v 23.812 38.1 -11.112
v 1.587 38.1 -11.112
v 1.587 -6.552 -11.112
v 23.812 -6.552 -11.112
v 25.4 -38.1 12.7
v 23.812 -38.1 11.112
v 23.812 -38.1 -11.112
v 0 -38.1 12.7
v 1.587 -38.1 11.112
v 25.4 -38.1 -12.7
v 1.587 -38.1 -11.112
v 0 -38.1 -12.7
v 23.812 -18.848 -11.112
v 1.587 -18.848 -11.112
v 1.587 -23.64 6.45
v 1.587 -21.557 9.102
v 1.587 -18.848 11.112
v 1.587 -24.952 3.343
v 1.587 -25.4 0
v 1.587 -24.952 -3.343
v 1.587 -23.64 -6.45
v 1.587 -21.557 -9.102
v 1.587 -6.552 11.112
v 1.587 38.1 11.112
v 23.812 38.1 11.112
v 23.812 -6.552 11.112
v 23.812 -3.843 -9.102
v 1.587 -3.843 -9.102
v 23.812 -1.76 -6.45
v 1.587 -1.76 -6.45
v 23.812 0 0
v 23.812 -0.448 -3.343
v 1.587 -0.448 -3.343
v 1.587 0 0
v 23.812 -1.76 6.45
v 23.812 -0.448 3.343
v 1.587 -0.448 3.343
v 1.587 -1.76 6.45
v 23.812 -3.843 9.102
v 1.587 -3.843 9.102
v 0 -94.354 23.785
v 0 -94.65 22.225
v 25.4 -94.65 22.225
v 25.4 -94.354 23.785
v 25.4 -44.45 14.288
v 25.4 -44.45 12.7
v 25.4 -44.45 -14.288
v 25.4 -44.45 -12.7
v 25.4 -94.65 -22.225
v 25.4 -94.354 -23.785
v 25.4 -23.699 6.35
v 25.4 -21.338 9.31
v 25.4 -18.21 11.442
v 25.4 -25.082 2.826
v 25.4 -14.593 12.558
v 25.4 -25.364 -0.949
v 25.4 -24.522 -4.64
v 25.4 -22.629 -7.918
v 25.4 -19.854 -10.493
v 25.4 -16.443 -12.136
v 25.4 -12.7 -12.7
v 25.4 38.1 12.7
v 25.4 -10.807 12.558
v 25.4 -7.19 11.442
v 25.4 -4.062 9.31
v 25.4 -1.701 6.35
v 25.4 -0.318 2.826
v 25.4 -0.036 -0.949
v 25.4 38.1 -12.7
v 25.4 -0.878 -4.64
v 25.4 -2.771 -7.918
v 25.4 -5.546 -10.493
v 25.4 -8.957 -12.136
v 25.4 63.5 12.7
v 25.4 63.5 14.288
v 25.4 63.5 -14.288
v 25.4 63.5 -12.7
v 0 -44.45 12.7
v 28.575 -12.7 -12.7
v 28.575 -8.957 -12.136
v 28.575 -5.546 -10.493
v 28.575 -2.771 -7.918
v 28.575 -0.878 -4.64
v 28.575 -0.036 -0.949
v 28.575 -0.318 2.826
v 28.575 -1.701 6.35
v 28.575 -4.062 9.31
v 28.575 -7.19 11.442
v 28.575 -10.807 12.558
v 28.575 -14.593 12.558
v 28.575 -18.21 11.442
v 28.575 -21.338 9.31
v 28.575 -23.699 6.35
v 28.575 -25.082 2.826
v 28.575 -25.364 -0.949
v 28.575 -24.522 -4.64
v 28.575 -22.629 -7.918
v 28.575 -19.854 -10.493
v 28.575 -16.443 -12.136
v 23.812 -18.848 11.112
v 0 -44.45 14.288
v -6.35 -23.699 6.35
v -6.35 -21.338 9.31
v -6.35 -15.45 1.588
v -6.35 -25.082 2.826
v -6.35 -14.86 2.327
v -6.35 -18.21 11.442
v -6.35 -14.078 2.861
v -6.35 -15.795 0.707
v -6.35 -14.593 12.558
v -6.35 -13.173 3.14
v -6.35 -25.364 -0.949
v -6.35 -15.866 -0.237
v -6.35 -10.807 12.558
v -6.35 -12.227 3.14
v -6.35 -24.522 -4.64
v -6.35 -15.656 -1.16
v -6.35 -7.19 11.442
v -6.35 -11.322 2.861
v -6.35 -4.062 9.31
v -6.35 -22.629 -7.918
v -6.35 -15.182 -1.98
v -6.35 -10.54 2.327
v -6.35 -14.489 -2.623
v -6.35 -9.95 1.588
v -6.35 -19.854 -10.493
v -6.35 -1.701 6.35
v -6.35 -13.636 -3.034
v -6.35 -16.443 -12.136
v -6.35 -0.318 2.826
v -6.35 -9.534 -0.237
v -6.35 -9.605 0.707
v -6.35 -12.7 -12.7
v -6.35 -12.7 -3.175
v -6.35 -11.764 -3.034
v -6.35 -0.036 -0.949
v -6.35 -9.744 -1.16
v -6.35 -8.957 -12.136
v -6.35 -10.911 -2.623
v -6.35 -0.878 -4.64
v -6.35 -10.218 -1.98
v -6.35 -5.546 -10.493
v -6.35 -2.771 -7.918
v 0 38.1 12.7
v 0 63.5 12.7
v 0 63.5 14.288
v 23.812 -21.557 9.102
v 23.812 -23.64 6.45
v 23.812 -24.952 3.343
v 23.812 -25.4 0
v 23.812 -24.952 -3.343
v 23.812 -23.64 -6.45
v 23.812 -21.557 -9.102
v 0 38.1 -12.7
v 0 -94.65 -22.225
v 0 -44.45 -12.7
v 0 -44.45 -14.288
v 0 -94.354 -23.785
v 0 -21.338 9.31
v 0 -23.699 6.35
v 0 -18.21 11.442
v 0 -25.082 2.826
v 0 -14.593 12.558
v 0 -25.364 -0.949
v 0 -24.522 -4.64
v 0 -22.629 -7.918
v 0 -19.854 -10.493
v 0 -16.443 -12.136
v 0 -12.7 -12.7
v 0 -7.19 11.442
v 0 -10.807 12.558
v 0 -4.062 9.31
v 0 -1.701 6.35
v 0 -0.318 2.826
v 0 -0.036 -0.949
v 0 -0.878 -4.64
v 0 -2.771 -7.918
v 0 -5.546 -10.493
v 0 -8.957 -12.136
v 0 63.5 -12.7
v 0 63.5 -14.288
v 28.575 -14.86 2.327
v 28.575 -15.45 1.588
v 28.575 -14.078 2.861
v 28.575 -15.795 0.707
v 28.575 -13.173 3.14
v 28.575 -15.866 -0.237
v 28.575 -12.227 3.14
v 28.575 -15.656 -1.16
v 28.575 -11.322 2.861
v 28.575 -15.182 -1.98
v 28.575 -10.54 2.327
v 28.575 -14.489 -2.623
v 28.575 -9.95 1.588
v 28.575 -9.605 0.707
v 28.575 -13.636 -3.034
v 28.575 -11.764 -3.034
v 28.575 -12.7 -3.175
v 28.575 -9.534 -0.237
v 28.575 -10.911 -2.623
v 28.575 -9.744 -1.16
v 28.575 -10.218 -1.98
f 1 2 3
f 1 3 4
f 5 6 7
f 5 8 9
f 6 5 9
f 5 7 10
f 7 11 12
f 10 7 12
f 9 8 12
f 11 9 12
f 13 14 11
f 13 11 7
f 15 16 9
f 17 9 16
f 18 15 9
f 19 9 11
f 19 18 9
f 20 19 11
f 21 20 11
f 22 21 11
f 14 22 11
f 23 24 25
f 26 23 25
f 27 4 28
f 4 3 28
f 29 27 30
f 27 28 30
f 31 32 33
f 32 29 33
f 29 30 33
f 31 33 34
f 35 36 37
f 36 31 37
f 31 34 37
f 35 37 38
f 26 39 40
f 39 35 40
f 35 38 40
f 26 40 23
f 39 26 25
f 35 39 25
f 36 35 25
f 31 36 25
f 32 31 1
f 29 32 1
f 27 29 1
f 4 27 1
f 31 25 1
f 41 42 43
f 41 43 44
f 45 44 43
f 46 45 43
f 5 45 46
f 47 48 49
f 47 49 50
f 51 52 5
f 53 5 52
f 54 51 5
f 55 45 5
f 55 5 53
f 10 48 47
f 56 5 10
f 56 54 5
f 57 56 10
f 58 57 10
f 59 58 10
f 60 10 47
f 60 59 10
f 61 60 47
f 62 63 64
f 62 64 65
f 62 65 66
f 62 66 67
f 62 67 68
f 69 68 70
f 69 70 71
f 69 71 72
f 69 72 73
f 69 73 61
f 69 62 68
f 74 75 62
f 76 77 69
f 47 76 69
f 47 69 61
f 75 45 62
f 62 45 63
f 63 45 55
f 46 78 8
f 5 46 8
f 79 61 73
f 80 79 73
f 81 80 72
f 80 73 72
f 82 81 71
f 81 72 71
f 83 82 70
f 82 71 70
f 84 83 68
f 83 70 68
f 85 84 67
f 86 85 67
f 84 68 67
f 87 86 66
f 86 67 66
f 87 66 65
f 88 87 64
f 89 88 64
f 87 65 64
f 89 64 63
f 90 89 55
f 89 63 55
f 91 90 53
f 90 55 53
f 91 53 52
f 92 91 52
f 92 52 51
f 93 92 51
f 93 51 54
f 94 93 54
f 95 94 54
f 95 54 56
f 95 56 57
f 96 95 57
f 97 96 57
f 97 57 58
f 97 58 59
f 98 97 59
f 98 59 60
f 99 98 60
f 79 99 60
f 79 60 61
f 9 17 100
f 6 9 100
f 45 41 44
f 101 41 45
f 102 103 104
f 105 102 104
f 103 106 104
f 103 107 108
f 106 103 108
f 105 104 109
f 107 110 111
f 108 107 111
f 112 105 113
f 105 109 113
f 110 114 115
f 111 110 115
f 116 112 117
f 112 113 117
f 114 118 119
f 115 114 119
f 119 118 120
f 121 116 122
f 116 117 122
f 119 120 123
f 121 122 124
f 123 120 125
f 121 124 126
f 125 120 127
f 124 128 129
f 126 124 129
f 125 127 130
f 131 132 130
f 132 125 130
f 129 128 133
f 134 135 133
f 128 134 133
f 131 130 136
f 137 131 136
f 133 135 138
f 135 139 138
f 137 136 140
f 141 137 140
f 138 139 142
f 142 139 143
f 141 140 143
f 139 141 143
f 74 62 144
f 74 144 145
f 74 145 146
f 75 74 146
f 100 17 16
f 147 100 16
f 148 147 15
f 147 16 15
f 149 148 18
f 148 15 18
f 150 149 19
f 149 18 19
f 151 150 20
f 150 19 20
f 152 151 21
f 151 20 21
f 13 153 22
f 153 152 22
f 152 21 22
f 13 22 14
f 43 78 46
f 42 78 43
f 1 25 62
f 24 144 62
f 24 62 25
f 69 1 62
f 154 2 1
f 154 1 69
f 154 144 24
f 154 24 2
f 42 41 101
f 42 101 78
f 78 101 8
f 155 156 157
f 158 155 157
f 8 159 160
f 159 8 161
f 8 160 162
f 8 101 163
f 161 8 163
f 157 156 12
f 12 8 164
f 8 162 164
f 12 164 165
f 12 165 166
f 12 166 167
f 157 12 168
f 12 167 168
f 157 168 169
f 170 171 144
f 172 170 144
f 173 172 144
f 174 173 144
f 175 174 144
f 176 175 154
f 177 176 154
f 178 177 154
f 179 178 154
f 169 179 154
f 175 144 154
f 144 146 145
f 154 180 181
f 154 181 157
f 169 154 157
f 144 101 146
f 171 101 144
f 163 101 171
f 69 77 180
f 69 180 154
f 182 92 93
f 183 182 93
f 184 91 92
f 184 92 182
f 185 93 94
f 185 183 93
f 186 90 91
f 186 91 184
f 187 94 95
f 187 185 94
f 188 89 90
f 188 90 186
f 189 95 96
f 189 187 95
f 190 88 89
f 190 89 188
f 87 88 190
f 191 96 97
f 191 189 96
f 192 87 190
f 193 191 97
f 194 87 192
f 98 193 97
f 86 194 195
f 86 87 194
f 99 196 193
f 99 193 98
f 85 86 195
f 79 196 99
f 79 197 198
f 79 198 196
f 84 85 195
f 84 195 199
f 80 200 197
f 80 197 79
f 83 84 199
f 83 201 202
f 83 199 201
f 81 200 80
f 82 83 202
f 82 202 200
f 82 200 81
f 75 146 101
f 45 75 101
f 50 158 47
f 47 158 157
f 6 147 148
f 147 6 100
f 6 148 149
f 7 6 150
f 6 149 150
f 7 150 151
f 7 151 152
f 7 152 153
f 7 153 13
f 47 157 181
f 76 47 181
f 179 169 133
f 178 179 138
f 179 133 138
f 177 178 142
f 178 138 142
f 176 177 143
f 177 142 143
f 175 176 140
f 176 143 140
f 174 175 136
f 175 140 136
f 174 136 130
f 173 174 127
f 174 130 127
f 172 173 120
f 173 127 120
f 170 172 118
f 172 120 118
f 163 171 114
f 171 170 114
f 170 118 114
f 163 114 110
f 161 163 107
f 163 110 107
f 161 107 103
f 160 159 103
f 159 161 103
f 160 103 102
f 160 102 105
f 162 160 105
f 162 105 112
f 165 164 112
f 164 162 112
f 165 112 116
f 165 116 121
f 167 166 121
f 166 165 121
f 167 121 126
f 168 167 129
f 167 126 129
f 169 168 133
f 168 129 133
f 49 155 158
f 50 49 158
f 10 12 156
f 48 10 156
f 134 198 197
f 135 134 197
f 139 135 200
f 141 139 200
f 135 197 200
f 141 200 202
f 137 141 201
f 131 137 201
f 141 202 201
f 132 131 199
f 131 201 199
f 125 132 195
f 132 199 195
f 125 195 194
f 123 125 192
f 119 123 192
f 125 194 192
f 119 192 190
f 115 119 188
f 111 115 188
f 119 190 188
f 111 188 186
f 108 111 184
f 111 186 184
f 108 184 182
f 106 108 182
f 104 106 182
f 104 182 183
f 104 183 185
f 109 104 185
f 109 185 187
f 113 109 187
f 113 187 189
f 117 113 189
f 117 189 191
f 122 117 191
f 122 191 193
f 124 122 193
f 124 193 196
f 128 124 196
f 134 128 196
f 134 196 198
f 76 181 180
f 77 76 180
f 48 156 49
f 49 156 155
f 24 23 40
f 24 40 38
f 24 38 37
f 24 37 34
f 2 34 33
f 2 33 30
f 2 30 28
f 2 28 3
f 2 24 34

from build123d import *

# Parameters (mm, degrees)
BOSS_EXTRUDE1_DEPTH      = 25.4
SKETCH2_W                = 22.225
SKETCH2_H                = 22.225
CUT_EXTRUDE1_DEPTH       = 138.235224905
BOSS_EXTRUDE2_DEPTH      = 3.175
BOSS_EXTRUDE2_DEPTH_BACK = 31.75
SKETCH3_R                = 12.7
SKETCH4_R                = 3.175
CUT_EXTRUDE3_DEPTH       = 104.653950262


with BuildPart() as part:
    # Sketch1 → Boss-Extrude1 (new body)
    with BuildSketch(Plane(origin=(0, 0, 0), x_dir=(0, 0, -1), z_dir=(1, 0, 0))):
        Polygon((23.784673135, -94.354345527), (14.2875, -44.45), (14.2875, 63.5), (12.7, 63.5), (12.7, 38.1), (-12.7, 38.1), (-12.7, 63.5), (-14.2875, 63.5), (-14.2875, -44.45), (-23.784673135, -94.354345527), (-22.225, -94.650277885), (-12.7, -44.45), (-12.7, -38.1), (12.7, -38.1), (12.7, -44.45), (22.225, -94.650277885), align=None)
    extrude(amount=BOSS_EXTRUDE1_DEPTH)

    # Sketch2 → Cut-Extrude1 (cut, through all)
    with BuildSketch(Plane(origin=(0, 38.1, 0), x_dir=(1, 0, 0), z_dir=(0, 1, 0))):
        with Locations((12.7, 0)):
            Rectangle(SKETCH2_W, SKETCH2_H)
    extrude(amount=-CUT_EXTRUDE1_DEPTH, mode=Mode.SUBTRACT)

    # Sketch3 → Boss-Extrude2 (add, two sides: drawn at the far end of the back side and taken through both)
    with BuildSketch(Plane(origin=(25.4, 0, 0), x_dir=(0, 0, -1), z_dir=(1, 0, 0)).offset(-BOSS_EXTRUDE2_DEPTH_BACK)):
        with Locations((0, -12.7)):
            Circle(SKETCH3_R)
    extrude(amount=BOSS_EXTRUDE2_DEPTH + BOSS_EXTRUDE2_DEPTH_BACK)

    # Sketch4 → Cut-Extrude3 (cut, through all)
    with BuildSketch(Plane(origin=(28.575, 0, 0), x_dir=(0, 0, -1), z_dir=(1, 0, 0))):
        with Locations((0, -12.7)):
            Circle(SKETCH4_R)
    extrude(amount=-CUT_EXTRUDE3_DEPTH, mode=Mode.SUBTRACT)


solid = part.part
